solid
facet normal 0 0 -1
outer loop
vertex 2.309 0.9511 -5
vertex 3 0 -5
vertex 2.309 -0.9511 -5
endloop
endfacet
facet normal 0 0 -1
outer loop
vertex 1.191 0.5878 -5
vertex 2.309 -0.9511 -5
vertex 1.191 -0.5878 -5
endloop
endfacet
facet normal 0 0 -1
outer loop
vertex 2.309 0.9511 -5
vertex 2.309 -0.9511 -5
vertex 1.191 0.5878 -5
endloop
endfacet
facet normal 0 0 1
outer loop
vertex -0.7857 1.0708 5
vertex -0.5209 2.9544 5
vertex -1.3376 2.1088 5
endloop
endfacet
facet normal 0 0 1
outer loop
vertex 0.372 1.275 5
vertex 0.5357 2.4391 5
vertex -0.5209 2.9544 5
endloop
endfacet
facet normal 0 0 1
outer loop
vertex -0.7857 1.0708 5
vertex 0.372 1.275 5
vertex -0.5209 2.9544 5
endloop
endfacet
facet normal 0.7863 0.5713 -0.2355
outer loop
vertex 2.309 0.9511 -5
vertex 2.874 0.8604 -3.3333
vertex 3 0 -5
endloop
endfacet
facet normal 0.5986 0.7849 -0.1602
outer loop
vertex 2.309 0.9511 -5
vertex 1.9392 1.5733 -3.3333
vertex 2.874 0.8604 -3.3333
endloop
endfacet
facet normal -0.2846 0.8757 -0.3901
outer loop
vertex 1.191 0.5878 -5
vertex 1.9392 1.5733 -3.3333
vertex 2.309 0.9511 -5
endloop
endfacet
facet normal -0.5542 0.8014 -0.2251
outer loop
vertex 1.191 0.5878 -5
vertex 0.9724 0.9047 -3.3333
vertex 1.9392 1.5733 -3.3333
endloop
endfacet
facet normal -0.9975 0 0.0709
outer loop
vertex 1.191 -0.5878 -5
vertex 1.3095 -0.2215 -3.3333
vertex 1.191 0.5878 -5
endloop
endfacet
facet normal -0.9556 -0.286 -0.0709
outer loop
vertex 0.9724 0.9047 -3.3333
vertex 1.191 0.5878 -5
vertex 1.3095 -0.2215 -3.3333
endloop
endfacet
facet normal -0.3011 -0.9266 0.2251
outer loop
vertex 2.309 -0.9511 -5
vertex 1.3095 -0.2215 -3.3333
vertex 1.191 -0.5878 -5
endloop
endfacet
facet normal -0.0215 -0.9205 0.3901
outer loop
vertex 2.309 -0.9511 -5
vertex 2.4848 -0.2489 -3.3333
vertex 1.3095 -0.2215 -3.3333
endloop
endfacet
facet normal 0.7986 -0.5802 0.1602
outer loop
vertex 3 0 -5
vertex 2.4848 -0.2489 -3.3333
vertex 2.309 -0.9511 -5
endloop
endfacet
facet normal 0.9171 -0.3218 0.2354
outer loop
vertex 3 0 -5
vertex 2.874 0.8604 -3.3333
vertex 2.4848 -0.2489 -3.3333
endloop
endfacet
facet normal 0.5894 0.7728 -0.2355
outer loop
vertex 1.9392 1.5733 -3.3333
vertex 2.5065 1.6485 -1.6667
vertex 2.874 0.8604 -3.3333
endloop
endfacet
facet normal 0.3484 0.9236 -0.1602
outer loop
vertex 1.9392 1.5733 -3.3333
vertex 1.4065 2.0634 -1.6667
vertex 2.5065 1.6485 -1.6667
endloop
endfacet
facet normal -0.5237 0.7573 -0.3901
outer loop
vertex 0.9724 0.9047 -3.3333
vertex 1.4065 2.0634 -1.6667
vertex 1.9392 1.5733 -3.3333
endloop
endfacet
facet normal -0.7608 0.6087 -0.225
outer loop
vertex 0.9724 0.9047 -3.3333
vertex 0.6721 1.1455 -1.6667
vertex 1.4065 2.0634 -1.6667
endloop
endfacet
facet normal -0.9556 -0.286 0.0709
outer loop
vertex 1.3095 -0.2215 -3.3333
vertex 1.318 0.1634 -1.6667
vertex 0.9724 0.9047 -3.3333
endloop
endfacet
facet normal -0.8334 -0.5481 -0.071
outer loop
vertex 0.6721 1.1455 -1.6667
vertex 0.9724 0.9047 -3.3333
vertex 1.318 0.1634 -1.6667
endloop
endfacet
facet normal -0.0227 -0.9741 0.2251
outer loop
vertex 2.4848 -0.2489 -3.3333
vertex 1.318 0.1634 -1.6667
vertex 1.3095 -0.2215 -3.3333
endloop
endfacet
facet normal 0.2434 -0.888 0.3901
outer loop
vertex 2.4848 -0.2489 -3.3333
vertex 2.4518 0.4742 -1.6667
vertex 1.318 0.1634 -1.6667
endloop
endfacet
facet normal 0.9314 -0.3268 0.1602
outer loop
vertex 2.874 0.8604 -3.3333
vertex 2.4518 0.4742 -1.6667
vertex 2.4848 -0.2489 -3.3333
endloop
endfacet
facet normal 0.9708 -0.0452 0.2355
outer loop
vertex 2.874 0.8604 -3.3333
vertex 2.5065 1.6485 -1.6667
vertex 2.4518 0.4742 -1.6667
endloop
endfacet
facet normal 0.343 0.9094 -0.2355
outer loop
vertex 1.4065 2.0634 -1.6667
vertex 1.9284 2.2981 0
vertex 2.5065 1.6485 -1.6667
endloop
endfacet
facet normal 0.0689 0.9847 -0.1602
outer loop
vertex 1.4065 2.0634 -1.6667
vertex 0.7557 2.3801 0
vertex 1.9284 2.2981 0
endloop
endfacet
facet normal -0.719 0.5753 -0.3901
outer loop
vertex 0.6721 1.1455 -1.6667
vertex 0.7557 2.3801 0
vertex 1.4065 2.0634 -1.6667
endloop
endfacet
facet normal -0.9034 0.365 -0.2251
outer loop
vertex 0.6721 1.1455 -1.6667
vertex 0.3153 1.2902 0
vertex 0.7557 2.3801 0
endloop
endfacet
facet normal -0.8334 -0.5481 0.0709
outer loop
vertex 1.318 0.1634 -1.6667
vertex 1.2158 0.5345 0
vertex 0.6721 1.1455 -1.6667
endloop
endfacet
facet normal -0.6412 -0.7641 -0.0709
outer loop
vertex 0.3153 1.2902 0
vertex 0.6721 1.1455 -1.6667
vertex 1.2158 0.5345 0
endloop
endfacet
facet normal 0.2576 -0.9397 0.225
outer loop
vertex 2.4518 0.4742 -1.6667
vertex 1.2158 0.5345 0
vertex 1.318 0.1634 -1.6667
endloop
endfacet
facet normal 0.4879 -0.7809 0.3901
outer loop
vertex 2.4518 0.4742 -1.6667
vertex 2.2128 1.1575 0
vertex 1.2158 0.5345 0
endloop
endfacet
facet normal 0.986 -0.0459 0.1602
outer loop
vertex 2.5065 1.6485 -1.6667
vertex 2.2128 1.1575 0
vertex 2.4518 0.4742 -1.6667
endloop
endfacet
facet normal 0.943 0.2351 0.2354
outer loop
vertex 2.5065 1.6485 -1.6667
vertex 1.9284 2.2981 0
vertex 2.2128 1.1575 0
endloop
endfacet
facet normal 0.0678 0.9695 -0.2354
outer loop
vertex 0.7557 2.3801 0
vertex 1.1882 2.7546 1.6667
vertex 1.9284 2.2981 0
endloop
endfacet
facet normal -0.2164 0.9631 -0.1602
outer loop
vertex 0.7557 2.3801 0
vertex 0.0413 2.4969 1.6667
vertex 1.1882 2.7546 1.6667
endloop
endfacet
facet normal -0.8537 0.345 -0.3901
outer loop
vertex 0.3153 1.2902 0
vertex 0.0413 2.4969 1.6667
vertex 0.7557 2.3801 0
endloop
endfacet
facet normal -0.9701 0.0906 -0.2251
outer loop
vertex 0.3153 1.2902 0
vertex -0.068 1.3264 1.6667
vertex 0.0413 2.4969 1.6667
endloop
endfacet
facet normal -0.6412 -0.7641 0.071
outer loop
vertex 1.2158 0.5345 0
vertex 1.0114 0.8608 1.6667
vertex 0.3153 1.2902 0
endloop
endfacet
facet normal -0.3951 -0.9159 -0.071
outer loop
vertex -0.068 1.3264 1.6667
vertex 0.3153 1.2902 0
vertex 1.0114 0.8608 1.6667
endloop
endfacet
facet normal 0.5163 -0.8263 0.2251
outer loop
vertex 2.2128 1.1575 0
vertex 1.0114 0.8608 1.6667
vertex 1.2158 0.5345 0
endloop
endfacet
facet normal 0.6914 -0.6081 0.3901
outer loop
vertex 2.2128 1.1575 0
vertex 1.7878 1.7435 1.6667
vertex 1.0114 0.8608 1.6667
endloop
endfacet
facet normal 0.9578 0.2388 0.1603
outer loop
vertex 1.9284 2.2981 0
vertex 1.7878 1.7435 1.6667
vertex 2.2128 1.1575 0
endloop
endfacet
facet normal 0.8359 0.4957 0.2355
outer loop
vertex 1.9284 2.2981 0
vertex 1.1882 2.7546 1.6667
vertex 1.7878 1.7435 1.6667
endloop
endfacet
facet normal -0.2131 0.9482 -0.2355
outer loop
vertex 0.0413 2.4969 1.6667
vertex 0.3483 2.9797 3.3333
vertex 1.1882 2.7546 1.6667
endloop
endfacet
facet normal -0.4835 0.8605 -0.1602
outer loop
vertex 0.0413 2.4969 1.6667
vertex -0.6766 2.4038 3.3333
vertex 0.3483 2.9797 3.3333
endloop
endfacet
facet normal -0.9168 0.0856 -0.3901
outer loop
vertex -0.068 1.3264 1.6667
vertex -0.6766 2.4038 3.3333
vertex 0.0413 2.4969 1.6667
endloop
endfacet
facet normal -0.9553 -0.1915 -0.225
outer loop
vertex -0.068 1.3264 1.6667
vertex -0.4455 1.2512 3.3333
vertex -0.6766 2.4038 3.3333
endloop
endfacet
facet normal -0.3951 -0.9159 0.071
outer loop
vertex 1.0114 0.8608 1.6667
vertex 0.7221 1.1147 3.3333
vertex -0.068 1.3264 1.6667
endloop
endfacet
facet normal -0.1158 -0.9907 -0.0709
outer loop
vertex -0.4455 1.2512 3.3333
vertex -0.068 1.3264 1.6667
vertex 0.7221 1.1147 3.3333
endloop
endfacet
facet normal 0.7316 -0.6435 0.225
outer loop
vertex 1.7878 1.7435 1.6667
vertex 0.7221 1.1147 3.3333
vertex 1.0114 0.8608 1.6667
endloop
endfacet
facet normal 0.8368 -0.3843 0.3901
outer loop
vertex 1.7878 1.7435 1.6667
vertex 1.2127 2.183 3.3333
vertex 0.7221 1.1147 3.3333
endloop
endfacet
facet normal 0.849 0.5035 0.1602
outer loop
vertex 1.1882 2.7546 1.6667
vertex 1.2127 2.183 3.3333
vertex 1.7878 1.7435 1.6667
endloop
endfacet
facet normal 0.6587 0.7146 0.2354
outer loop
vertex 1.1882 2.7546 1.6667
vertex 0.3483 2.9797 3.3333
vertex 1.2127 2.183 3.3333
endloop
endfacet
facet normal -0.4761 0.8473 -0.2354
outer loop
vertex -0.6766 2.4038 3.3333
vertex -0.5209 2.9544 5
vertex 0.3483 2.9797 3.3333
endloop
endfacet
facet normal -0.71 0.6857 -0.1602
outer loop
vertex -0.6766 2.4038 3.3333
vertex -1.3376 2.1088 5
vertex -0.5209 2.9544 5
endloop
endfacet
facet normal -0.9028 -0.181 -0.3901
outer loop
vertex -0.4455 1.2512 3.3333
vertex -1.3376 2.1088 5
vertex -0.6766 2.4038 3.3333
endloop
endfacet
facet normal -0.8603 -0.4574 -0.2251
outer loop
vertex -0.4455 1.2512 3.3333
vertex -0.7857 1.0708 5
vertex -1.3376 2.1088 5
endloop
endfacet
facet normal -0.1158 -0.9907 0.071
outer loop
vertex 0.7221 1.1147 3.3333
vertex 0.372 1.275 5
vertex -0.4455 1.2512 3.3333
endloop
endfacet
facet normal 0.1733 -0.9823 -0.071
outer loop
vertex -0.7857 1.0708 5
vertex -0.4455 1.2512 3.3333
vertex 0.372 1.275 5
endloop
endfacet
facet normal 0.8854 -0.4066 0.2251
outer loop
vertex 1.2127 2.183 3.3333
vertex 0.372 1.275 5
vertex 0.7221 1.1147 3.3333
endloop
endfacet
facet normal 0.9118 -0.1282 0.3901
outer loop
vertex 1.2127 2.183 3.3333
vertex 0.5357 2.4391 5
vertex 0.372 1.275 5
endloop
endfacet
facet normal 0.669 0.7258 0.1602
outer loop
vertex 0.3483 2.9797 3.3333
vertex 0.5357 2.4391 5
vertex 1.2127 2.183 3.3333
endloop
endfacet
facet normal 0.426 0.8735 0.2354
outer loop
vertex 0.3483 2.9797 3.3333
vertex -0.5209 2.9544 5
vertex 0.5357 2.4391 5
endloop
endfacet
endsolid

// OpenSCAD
// Unit of length: Unit.MM
linear_extrude(height = 10.0, center = true, convexity = 10, twist = -100.0, scale = 1.0)
{
   translate(v = [2.0, 0.0])
   {
      circle(r = 1.0);
   }
}
